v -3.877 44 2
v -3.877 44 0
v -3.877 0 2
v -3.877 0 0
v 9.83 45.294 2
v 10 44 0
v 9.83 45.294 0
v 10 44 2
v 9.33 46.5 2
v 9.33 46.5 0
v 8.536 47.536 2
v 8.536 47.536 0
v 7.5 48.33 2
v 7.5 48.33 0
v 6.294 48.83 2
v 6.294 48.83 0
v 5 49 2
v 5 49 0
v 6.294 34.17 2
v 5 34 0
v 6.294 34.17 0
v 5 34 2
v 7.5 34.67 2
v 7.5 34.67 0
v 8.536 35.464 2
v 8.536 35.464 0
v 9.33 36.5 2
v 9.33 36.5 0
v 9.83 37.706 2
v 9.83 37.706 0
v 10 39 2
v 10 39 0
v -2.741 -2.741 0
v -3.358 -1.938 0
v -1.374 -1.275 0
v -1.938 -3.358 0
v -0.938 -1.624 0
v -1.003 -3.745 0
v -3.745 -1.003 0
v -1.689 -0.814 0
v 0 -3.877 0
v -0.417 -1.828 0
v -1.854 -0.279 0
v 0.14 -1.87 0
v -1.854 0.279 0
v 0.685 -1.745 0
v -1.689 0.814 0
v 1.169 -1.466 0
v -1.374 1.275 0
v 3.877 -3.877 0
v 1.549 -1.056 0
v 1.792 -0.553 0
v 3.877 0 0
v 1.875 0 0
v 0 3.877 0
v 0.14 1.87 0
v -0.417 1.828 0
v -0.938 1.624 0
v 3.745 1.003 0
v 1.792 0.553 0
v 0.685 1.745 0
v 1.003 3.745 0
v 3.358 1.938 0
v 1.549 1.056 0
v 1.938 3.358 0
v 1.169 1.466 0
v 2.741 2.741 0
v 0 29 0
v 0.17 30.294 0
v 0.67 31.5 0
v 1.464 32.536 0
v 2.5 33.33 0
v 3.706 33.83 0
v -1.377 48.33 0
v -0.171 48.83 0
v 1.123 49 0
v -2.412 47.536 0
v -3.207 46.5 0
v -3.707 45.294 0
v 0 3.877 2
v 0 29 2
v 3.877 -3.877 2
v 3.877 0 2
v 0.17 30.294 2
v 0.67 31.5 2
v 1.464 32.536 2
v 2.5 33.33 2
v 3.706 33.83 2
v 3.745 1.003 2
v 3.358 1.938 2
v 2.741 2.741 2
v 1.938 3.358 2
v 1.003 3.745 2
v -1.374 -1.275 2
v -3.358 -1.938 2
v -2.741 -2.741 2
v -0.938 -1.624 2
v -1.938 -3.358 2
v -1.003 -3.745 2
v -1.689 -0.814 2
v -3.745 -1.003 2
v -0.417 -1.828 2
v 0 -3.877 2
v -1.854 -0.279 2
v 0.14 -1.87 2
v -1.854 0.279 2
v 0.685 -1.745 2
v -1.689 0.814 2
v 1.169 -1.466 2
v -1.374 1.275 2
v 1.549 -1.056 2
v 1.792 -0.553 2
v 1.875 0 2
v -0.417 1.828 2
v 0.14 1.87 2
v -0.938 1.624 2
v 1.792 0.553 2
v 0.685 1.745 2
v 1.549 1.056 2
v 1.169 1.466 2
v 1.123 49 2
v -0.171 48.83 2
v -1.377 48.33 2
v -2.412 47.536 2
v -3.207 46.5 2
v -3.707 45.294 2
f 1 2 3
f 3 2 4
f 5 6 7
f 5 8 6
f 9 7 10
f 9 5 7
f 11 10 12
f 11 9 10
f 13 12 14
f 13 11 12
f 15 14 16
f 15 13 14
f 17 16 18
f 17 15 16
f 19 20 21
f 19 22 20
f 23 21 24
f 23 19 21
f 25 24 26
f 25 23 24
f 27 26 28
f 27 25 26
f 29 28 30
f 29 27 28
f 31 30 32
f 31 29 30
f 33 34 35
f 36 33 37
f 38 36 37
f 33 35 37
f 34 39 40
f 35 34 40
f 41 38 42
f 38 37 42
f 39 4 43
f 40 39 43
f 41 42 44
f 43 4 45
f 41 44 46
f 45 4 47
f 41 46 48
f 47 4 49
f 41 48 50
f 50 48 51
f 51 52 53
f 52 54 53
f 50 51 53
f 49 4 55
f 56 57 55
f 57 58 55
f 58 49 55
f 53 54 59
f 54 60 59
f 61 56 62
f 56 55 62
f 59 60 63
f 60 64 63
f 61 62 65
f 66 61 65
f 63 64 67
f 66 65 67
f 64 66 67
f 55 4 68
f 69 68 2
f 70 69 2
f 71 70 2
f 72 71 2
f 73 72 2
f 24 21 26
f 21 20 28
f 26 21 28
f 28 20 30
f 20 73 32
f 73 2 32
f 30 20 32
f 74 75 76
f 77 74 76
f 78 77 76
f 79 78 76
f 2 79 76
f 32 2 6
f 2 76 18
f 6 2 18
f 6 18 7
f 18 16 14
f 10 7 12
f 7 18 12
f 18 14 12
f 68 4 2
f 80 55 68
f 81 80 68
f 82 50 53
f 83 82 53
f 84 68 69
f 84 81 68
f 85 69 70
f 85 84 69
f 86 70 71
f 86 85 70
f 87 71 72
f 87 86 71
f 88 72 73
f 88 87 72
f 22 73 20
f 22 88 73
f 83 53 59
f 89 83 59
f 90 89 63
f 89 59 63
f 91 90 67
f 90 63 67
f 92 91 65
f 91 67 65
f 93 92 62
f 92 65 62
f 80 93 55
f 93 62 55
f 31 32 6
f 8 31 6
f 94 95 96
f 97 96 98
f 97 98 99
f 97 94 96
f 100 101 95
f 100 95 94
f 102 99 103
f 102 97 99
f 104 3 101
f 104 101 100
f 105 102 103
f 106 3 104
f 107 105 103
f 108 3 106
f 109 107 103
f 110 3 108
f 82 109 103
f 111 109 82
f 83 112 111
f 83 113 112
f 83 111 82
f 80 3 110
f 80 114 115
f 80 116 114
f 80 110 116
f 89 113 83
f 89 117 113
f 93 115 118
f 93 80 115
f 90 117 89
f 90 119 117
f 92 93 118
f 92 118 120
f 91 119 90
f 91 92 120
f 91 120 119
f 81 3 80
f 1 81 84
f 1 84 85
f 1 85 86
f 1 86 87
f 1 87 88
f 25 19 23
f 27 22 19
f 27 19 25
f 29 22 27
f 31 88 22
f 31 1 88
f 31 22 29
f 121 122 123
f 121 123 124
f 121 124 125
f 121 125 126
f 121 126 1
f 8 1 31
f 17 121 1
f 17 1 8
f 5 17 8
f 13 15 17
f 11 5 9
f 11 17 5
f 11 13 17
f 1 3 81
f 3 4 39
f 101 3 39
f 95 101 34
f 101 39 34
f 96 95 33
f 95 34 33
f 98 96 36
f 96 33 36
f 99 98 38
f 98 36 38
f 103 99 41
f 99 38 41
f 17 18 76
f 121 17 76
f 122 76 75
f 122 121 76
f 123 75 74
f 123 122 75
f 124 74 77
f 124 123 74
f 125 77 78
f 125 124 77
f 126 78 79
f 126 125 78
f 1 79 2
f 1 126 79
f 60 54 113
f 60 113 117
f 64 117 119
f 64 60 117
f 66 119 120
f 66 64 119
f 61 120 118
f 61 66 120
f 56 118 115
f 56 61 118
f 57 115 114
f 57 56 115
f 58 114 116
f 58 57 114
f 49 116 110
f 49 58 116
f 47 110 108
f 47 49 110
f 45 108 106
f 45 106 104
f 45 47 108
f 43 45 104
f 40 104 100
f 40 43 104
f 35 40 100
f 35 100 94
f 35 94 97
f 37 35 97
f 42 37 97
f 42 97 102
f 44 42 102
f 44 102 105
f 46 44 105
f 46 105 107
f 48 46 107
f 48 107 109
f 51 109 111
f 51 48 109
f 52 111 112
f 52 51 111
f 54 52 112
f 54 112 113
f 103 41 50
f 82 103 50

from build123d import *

# Parameters (mm, degrees)
F0_R     = 1.875
F1_DEPTH = 2
F2_R     = 4.99999


# Not quite as in the source:
# - a fillet or chamfer is up to 0.001 mm smaller than in the source, because OpenCascade refuses the exact size


with BuildPart() as f1:
    # F0 (on Top) → F1 (new body)
    with BuildSketch(Plane.XY):
        with BuildLine():
            ThreePointArc((0, 3.876953125), (-2.741419845, 2.741419845), (-3.876953125, 0))
            ThreePointArc((-3.876953125, 0), (-2.741419845, -2.741419845), (0, -3.876953125))
            ThreePointArc((0, -3.876953125), (2.741419845, -2.741419845), (3.876953125, 0))
            ThreePointArc((3.876953125, 0), (2.741419845, 2.741419845), (0, 3.876953125))
        make_face()
        Circle(F0_R, mode=Mode.SUBTRACT)
        with BuildLine():
            Line((-3.876953125, 49), (-3.876953125, 0))
            ThreePointArc((-3.876953125, 0), (-2.741419845, 2.741419845), (0, 3.876953125))
            Line((0, 3.876953125), (0, 34))
            Line((0, 34), (10, 34))
            Line((10, 34), (10, 49))
            Line((10, 49), (-3.876953125, 49))
        make_face()
        with BuildLine():
            ThreePointArc((3.876953125, 0), (2.741419845, -2.741419845), (0, -3.876953125))
            Line((0, -3.876953125), (3.876953125, -3.876953125))
            Line((3.876953125, -3.876953125), (3.876953125, 0))
        make_face()
    extrude(amount=F1_DEPTH)

    # F2 (radius 5 in the source; OpenCascade refuses exactly that, so slightly less here)
    f2_edges = [f1.edges().sort_by_distance(p)[0] for p in [
        (0, 34, 1),
        (10, 34, 1),
        (10, 49, 1),
        (-3.876953, 49, 1),
    ]]
    fillet(f2_edges, radius=F2_R)


solid = f1.part
